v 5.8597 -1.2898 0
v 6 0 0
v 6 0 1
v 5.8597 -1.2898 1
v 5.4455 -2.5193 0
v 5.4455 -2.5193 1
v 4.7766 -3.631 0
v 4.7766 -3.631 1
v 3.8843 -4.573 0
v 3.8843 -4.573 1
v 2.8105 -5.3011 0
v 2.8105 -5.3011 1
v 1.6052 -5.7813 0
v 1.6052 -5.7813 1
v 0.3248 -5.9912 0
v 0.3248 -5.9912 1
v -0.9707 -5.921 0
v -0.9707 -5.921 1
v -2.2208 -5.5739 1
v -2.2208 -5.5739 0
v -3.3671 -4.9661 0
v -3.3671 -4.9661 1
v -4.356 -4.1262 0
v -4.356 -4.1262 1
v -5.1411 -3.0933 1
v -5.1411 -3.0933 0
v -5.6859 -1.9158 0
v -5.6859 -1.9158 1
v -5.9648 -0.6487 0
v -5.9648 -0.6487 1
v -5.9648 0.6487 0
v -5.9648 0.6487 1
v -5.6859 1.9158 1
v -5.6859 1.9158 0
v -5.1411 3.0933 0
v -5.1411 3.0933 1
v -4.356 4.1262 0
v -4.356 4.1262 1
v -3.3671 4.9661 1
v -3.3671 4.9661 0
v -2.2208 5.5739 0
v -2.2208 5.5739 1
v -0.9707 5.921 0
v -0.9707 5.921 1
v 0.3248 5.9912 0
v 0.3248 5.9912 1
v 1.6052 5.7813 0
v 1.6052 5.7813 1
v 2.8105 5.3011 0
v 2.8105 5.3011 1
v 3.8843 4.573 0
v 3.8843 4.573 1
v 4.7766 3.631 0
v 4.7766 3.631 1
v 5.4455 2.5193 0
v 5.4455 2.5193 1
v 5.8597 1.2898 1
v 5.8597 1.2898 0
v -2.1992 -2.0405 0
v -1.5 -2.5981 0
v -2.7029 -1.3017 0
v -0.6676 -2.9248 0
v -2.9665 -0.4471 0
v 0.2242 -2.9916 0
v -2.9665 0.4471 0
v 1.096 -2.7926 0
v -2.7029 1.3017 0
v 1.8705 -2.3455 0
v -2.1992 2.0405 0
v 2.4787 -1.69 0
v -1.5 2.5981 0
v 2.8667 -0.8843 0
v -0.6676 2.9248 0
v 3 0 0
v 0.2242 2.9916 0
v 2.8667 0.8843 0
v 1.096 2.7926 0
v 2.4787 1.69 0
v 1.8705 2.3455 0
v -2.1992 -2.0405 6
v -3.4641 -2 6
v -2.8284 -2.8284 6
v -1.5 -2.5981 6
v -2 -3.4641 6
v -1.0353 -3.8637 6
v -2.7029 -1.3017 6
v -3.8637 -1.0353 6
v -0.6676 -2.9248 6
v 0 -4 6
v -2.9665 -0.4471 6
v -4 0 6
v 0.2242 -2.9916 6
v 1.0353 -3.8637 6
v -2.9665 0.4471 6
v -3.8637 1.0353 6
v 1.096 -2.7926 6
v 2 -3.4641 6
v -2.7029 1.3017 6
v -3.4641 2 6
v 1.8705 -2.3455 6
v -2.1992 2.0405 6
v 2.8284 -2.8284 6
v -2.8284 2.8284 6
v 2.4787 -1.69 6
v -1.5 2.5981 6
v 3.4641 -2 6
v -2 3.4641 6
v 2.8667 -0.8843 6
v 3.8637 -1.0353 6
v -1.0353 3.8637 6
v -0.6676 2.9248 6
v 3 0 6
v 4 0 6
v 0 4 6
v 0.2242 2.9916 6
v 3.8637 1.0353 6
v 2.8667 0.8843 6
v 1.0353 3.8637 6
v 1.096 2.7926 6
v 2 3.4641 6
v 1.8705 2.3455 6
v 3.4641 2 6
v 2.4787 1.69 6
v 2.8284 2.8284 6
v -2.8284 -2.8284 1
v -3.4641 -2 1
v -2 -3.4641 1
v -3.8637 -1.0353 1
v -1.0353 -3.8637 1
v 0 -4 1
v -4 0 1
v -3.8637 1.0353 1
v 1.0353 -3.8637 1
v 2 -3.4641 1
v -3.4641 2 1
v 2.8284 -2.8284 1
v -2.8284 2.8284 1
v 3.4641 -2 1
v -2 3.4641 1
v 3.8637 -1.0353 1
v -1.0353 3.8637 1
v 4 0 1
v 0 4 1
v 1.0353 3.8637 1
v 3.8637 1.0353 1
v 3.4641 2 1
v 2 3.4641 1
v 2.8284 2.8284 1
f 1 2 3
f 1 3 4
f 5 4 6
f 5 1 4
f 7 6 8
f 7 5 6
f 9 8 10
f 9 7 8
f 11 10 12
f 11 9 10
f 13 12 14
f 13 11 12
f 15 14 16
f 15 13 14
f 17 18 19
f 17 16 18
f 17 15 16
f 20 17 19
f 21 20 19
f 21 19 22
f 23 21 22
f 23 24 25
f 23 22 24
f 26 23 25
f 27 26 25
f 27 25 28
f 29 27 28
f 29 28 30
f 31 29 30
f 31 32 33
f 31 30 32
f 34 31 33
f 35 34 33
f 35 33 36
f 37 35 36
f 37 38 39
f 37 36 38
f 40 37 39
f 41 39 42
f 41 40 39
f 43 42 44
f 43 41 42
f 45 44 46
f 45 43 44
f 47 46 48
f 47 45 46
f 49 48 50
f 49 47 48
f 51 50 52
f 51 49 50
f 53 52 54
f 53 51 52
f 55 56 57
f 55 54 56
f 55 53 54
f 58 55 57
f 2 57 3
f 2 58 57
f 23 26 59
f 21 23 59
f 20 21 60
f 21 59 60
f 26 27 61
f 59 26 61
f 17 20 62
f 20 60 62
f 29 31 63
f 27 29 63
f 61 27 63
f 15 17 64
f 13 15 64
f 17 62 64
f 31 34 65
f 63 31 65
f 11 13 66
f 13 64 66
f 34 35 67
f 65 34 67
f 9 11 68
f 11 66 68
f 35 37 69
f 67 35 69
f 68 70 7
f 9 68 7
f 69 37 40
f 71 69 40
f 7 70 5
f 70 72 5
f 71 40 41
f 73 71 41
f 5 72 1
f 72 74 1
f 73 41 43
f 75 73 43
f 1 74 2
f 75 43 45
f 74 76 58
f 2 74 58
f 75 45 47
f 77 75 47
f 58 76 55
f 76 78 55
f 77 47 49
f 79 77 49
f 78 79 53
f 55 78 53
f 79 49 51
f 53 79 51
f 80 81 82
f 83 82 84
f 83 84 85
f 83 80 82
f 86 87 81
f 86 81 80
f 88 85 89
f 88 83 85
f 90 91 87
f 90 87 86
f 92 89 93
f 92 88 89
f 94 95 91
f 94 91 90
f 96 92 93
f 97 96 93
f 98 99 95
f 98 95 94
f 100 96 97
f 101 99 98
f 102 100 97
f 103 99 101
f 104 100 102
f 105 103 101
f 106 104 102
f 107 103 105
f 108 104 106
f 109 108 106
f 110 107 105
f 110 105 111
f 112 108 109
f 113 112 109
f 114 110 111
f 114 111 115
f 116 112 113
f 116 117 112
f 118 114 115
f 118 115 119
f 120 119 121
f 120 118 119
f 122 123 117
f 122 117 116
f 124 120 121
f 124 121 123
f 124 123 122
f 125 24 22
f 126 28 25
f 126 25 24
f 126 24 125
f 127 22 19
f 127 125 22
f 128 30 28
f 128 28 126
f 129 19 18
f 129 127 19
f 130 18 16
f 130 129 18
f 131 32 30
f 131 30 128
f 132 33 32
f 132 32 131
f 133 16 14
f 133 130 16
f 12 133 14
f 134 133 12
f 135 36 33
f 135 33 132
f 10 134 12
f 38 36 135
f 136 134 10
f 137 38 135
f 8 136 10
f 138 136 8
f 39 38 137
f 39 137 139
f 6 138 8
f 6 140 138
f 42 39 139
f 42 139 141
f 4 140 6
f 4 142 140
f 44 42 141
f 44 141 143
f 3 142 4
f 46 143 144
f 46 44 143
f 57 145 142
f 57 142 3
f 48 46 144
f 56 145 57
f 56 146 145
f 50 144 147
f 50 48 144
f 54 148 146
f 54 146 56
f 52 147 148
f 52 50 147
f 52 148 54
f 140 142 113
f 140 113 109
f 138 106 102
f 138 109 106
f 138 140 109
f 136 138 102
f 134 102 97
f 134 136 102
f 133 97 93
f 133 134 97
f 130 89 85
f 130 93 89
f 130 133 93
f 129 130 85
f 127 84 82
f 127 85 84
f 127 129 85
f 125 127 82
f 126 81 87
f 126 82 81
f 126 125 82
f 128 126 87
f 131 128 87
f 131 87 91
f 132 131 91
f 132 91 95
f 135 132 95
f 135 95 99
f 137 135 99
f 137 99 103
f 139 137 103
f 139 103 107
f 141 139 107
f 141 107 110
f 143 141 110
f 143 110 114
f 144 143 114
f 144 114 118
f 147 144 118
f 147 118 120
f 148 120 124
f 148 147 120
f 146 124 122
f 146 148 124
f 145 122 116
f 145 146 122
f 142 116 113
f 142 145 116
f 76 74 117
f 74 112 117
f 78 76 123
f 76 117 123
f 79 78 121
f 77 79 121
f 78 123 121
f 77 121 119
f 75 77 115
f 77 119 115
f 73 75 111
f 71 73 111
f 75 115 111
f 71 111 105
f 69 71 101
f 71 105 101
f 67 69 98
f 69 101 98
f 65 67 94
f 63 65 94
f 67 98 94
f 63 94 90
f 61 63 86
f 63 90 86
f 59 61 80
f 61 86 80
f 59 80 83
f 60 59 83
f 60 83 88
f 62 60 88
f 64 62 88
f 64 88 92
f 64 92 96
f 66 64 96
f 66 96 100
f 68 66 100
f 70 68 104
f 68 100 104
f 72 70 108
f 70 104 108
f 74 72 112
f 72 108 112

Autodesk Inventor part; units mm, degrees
ref_plane "YZ Plane" through (0, 0, 0) normal (1, 0, 0) x (0, 1, 0)
ref_plane "XZ Plane" through (0, 0, 0) normal (0, 1, 0) x (-1, 0, 0)
ref_plane "XY Plane" through (0, 0, 0) normal (0, 0, 1) x (1, 0, 0)
sketch "スケッチ1" plane through (0, 0, 0) normal (0, 0, 1) x (1, 0, 0)
  circle A0 centre (0, 0) radius 6
  dimension "d0" = 12
extrude "押し出し1" add sketch "スケッチ1" along normal blind 1
sketch "スケッチ2" plane through (0, 0, 1) normal (0, 0, 1) x (1, 0, 0)
  circle A0 centre (0, 0) radius 4
  circle A1 centre (0, 0) radius 3
  dimension "d3" = 8
  dimension "d4" = 6
extrude "押し出し2" add sketch "スケッチ2" along normal blind 5 contours A0 | A1
sketch "スケッチ3" plane through (0, 0, 6) normal (0, 0, 1) x (1, 0, 0)
  circle A0 centre (0, 0) radius 4 projected
  circle A1 centre (0, 0) radius 3
  dimension "d7" = 6
extrude "押し出し3" cut sketch "スケッチ3" against normal blind 6 contours A1
properties part number "フランジブッシュ　d6-D8-l5-h12" material "アセタール樹脂、黒"
